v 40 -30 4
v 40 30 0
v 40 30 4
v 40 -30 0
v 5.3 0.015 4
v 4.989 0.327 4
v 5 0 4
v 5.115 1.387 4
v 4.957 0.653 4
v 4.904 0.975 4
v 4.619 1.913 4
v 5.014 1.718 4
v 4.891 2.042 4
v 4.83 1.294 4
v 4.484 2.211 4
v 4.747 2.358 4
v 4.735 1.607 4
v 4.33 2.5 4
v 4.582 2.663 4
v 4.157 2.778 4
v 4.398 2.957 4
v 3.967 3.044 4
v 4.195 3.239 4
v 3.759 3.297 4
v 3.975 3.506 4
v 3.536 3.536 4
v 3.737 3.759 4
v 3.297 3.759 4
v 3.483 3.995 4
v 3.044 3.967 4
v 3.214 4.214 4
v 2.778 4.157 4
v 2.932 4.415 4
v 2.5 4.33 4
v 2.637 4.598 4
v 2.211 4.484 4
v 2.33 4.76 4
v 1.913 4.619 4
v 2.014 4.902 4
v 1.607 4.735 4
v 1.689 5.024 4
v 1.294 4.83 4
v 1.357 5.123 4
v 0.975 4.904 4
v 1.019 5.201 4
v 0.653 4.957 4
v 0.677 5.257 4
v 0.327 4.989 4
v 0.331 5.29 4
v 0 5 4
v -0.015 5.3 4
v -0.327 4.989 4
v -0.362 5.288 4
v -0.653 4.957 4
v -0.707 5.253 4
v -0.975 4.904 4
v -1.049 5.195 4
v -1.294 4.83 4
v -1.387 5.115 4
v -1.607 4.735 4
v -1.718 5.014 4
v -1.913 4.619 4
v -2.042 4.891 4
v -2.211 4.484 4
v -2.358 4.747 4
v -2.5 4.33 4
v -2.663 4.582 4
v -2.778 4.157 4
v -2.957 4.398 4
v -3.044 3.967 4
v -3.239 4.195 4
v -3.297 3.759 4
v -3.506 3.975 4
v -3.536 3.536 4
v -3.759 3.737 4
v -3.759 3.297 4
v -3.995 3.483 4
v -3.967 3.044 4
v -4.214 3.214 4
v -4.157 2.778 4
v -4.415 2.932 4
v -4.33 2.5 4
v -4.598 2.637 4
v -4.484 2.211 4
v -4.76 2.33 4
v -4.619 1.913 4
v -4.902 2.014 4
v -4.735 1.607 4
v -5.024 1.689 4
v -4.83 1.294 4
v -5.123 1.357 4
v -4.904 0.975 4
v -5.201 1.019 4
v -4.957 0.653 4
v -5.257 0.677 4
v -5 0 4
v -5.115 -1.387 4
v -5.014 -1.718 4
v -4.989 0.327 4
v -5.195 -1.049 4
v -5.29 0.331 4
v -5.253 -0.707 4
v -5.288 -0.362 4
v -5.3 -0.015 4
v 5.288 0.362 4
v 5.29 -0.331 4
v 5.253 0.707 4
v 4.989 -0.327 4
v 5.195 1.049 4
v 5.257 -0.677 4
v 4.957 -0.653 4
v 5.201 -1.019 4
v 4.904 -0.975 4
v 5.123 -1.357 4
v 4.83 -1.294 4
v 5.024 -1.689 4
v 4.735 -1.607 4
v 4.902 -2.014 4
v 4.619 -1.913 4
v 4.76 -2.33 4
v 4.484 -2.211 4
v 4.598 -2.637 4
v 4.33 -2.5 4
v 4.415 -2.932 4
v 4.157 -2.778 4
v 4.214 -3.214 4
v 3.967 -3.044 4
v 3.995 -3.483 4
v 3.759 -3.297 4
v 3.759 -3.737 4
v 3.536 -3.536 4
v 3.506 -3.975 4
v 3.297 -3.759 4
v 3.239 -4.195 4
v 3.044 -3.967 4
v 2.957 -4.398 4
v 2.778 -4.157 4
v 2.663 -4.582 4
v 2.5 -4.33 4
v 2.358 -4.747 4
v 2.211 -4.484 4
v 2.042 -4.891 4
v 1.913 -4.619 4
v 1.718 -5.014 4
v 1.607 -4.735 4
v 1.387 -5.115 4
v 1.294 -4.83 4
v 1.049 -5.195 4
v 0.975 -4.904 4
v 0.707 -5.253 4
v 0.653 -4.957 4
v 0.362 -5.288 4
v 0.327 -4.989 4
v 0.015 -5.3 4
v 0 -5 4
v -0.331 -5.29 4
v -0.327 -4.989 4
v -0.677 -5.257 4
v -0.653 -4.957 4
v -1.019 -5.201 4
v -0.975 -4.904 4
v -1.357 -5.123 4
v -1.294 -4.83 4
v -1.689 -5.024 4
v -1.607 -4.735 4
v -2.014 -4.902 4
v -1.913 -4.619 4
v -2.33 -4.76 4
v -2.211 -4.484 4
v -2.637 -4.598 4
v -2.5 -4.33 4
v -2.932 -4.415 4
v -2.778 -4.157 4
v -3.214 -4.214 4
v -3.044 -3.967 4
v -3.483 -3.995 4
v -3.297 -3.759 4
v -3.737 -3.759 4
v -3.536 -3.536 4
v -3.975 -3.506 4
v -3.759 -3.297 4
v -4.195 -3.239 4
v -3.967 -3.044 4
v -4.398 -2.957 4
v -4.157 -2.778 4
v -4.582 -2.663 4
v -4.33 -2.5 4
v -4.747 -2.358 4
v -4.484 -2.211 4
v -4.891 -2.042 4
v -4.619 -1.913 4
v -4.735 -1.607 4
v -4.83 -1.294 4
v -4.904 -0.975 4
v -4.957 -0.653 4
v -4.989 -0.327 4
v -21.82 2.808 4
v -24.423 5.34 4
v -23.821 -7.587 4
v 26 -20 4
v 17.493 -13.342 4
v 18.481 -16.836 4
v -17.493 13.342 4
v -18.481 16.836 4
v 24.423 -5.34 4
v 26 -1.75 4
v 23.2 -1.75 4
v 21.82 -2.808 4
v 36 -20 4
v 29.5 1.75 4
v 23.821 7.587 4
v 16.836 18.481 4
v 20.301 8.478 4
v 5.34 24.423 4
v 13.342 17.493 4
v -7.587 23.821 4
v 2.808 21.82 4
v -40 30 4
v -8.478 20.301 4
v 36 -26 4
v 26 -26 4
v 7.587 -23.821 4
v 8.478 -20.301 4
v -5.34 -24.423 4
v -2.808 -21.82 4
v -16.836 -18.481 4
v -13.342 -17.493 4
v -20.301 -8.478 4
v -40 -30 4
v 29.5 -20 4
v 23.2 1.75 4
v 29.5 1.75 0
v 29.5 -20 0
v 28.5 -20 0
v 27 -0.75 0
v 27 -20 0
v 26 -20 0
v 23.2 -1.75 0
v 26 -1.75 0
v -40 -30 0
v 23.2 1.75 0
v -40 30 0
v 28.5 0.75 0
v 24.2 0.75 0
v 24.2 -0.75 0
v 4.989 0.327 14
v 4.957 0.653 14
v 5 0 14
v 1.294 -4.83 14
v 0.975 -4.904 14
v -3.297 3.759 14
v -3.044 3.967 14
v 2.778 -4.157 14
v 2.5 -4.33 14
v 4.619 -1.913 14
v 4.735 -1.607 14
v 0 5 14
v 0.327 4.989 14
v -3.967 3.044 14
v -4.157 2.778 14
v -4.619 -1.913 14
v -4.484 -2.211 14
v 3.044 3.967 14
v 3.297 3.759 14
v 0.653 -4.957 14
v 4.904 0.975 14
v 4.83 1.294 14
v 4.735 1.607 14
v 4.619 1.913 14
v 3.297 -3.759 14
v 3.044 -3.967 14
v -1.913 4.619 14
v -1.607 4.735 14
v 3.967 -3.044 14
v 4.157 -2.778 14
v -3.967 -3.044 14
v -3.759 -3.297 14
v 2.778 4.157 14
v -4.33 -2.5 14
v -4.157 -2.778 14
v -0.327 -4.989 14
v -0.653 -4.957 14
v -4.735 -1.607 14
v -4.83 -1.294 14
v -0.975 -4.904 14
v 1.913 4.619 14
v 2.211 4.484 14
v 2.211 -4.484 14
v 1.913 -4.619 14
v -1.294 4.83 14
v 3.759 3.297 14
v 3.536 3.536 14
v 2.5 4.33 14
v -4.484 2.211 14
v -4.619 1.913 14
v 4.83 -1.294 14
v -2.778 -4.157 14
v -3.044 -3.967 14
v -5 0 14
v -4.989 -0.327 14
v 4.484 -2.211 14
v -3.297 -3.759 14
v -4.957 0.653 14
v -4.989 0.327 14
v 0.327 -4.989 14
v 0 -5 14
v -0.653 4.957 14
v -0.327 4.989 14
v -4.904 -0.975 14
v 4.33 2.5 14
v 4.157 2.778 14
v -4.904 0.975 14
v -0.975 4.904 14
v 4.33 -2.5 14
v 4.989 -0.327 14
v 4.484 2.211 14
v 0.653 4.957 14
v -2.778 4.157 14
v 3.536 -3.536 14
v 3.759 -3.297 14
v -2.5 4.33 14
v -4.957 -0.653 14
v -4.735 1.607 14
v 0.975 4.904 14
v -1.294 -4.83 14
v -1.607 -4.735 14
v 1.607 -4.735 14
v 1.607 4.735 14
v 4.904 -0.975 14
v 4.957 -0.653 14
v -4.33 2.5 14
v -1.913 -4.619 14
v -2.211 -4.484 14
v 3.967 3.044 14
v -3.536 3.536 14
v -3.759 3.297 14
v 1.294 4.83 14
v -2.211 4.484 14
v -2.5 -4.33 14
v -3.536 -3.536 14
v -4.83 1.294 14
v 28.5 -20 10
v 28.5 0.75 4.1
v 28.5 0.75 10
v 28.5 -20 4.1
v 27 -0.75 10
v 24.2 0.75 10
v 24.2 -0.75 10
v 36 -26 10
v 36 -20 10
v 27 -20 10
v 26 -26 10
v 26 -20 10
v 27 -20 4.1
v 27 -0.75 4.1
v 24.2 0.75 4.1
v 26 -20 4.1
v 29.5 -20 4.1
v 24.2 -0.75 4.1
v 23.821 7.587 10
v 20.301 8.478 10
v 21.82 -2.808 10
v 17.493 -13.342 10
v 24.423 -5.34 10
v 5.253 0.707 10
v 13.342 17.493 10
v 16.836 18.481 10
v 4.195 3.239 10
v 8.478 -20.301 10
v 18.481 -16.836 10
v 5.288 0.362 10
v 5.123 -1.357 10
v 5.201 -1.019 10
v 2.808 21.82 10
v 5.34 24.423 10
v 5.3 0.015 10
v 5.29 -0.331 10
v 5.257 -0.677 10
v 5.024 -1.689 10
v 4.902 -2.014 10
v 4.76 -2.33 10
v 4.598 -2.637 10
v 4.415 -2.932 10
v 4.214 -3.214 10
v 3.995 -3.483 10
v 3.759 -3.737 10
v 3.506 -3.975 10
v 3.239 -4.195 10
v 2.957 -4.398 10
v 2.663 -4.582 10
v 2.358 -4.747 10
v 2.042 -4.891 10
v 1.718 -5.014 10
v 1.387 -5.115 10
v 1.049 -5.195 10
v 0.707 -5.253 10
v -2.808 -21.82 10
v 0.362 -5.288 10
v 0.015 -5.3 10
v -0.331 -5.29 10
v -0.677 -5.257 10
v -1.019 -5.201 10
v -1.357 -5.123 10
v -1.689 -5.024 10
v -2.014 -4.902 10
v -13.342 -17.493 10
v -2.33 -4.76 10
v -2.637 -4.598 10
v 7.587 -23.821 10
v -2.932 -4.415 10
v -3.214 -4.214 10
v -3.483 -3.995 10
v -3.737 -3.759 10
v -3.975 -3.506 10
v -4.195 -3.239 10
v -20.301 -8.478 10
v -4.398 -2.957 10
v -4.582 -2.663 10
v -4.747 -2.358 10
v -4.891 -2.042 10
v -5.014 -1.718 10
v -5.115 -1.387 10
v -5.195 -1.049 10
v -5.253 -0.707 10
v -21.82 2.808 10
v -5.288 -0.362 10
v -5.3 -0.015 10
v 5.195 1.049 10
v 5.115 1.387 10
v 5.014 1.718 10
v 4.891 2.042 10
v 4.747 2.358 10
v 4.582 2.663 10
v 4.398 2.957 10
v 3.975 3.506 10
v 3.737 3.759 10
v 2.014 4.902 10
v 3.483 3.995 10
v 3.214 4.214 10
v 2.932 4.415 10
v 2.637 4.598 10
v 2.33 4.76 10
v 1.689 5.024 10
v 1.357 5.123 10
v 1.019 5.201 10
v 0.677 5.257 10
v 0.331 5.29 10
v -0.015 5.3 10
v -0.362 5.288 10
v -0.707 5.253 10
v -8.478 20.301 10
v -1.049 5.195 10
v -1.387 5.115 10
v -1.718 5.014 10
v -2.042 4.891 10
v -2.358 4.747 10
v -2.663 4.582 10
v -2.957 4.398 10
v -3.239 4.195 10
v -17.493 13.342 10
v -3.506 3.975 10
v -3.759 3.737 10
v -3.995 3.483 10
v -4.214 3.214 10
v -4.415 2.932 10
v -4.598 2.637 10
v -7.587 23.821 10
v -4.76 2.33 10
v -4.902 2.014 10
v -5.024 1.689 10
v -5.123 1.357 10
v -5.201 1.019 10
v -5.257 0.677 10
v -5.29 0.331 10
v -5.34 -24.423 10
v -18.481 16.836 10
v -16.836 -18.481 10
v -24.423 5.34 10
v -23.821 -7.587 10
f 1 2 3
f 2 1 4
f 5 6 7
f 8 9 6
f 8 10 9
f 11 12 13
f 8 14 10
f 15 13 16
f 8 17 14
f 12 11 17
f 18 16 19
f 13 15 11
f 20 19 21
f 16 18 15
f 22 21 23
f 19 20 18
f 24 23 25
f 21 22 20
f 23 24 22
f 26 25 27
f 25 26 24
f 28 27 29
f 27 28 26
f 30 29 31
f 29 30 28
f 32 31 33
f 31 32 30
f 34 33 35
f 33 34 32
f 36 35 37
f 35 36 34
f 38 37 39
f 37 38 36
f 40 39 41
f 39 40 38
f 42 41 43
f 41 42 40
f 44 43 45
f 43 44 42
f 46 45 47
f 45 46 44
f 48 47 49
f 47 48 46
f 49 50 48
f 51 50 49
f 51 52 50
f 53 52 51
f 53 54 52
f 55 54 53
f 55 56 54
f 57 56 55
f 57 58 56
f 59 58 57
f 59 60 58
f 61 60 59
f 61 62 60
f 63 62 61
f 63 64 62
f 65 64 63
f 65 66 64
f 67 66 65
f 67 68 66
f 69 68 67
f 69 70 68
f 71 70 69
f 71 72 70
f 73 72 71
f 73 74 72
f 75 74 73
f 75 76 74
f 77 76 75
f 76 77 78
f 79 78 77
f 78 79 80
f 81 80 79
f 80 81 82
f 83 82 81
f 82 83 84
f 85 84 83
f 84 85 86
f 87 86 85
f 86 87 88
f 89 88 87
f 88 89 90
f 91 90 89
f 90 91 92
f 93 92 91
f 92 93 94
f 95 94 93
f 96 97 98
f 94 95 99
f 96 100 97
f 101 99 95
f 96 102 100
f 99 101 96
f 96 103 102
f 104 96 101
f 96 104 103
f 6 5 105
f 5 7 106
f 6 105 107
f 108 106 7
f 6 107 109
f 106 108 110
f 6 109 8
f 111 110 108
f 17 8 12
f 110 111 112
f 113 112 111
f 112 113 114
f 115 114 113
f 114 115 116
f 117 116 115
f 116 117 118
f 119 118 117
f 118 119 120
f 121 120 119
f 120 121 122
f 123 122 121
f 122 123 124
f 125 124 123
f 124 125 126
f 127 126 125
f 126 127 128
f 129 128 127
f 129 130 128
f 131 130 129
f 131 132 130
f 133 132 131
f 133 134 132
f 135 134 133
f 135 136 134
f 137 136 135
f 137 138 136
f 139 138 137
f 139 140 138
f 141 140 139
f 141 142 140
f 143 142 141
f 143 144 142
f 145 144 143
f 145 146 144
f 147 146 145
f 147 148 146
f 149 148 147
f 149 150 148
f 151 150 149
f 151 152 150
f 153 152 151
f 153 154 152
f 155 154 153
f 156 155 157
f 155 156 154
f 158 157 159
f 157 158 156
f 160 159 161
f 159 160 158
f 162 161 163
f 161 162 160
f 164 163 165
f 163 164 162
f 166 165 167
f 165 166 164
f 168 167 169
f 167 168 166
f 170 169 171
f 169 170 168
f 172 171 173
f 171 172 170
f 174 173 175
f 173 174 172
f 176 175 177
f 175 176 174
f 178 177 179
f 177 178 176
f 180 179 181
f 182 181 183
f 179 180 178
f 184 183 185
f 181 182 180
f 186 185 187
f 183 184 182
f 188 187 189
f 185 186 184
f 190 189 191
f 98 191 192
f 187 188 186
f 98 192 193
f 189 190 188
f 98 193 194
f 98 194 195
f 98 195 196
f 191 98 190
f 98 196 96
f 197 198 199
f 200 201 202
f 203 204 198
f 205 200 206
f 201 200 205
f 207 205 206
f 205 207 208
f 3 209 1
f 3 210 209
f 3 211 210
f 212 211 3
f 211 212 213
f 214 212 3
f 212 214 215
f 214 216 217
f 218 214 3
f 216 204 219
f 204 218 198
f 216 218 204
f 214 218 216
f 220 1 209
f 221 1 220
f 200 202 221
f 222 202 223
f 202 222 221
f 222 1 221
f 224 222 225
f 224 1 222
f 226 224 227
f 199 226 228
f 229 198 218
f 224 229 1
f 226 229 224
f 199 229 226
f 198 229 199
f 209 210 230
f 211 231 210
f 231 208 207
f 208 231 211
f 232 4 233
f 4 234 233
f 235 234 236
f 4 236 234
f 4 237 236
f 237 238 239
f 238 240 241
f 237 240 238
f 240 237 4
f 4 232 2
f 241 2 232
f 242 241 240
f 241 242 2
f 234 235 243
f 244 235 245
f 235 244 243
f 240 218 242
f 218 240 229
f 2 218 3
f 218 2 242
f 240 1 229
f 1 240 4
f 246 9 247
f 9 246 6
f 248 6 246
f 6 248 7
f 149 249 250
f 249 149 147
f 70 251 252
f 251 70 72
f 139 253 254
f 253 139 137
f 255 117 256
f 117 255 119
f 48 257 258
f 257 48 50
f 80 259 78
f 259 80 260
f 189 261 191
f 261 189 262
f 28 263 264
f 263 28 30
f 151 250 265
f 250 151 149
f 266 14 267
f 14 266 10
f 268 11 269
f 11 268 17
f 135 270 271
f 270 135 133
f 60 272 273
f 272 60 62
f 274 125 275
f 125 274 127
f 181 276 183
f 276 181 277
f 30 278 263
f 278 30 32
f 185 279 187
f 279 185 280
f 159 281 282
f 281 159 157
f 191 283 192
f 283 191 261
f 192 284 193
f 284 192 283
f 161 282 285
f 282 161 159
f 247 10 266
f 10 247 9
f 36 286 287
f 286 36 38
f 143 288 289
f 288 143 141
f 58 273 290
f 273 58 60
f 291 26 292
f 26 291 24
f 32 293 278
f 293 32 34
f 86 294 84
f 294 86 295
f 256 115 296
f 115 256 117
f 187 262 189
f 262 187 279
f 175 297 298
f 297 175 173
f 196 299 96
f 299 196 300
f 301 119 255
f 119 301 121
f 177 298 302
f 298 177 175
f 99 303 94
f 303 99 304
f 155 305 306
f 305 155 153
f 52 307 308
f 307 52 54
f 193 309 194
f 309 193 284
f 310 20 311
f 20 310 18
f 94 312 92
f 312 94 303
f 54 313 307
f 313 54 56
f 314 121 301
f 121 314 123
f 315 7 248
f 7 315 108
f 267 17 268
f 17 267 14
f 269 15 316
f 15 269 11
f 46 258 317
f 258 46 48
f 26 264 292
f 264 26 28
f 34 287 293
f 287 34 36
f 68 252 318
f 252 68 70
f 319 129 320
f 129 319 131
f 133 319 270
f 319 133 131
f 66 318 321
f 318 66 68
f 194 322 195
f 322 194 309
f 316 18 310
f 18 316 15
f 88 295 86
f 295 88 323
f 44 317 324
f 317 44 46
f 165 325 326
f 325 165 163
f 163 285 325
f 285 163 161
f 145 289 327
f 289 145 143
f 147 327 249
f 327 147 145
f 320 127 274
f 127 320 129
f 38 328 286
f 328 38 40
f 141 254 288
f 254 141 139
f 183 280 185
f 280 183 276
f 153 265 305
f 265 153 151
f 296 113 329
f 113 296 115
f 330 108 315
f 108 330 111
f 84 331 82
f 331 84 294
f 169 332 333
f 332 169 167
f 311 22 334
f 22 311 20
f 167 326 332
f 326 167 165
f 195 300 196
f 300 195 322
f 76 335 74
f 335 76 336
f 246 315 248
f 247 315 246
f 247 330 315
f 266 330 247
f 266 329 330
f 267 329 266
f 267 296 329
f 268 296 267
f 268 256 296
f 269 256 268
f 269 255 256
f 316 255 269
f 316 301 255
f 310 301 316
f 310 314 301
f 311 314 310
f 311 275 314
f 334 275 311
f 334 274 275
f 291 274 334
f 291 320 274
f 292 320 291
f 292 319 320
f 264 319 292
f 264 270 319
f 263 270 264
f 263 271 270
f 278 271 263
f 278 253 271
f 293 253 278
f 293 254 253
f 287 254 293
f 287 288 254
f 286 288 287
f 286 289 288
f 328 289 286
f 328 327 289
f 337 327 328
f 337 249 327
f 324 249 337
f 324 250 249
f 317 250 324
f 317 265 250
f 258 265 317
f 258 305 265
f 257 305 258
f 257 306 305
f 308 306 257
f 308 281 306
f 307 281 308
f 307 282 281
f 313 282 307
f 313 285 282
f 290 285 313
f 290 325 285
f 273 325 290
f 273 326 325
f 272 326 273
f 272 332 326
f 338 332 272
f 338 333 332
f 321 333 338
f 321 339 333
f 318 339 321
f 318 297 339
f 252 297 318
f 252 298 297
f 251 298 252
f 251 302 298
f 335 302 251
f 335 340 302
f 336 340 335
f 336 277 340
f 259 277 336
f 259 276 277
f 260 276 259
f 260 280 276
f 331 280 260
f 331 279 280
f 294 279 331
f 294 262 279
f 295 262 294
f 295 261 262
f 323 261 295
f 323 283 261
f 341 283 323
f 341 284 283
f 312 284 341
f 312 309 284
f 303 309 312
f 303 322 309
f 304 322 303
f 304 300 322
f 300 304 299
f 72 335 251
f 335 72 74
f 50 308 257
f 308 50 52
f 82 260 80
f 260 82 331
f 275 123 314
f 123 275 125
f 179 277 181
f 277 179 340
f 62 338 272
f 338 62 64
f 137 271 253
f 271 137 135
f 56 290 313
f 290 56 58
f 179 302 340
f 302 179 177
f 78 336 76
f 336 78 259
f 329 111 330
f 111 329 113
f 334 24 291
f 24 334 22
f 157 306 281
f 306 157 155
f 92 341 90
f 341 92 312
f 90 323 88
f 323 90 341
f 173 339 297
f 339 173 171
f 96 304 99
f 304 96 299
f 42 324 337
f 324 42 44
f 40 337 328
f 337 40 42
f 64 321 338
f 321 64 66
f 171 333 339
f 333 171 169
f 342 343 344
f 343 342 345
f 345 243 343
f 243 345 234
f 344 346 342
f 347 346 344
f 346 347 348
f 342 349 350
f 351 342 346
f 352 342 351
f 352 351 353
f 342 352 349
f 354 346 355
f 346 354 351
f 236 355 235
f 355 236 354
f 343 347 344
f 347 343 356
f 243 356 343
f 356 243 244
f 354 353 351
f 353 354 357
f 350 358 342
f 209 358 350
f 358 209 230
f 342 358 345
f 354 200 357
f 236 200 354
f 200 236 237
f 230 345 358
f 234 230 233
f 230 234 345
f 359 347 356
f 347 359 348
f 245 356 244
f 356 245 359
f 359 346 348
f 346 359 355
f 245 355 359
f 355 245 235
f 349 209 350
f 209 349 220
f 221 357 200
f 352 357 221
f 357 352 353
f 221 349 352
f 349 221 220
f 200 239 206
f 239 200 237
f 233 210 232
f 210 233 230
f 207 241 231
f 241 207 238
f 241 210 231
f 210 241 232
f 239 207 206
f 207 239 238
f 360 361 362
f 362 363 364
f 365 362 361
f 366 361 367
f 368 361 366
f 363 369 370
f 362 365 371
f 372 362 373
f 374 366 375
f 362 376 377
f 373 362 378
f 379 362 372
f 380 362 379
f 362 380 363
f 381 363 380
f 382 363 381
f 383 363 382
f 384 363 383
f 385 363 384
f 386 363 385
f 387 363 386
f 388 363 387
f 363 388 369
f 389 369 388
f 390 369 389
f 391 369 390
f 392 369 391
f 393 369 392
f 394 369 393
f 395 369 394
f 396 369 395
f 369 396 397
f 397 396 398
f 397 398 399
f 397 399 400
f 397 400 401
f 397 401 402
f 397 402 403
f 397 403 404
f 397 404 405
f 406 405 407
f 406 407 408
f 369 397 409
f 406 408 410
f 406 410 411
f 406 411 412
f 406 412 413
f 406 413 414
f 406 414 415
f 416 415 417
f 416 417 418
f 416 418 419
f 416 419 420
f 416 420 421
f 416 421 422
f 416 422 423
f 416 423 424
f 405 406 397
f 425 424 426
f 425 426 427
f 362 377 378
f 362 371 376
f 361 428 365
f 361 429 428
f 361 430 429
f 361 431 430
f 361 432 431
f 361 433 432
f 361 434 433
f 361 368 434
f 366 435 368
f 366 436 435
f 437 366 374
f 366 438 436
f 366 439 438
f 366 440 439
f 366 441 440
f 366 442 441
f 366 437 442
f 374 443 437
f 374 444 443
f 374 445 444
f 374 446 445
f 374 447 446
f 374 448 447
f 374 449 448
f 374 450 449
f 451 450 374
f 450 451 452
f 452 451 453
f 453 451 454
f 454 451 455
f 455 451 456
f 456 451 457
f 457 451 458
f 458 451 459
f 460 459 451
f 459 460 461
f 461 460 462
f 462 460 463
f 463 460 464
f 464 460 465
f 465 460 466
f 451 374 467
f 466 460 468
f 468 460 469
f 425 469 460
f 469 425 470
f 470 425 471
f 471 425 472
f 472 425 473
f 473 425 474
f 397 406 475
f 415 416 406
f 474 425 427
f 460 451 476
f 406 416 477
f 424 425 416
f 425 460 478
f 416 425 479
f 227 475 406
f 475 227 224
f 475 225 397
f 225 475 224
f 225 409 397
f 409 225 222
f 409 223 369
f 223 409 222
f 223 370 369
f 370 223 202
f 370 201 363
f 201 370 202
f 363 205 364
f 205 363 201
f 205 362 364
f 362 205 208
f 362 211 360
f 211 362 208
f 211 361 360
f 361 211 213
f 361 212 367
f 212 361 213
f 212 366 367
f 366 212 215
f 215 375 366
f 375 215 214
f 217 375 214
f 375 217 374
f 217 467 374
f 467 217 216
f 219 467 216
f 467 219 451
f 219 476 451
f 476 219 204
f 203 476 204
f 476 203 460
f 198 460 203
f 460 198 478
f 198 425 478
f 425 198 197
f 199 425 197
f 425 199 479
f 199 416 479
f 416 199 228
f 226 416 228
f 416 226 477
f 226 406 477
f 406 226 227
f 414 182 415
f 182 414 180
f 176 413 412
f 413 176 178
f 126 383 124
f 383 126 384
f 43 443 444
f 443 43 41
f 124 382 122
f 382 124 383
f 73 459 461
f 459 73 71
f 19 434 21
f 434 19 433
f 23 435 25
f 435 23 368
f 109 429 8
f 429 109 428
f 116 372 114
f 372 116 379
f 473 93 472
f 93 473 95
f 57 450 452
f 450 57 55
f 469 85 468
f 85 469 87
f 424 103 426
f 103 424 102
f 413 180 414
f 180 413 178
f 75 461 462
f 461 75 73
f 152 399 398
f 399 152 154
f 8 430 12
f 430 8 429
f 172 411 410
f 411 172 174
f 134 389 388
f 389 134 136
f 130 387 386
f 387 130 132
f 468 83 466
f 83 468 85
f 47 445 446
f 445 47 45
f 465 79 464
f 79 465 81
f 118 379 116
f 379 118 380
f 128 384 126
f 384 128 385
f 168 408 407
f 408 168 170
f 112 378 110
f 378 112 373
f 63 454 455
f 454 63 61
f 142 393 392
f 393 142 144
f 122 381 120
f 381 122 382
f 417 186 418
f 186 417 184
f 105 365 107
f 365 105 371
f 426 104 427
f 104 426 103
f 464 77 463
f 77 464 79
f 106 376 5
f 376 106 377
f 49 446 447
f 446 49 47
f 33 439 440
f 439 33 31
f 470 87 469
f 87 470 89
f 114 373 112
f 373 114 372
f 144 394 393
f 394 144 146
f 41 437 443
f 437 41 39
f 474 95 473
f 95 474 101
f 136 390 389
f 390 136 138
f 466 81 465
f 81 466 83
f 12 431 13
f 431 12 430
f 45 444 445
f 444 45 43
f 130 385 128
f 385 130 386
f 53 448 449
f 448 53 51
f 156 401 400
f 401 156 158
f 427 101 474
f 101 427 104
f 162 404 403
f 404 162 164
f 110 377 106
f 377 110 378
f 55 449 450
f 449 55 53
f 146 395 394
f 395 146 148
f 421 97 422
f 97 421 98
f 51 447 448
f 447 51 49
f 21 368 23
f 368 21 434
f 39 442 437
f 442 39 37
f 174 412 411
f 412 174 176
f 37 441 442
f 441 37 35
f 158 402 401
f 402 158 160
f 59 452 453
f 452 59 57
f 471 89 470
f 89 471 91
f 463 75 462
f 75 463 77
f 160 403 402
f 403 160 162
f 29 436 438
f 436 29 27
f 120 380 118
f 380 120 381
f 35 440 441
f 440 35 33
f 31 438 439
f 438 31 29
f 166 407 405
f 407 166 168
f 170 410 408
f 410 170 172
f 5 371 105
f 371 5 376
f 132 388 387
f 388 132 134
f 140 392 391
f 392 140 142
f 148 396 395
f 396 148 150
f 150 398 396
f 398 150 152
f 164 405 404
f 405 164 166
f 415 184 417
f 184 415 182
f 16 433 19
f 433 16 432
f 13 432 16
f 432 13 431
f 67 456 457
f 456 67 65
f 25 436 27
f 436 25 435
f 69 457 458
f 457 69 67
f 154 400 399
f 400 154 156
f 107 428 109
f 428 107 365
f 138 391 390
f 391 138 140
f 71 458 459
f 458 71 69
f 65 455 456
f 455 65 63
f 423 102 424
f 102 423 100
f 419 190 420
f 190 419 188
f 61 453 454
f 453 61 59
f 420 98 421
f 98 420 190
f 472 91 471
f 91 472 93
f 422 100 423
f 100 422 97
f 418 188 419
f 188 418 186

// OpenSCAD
cadverify_only = "";
module instance(name, part, unit = 1) {
    echo(cadverify_instance = [name, part, unit]);
    if (cadverify_only == "" || cadverify_only == name) children();
}

// Part selector: base, wheel, assembly
part = "assembly"; // [base, wheel, assembly]

$fn = 96;

// Parameters
Rt = 25;        // wheel tip radius (50mm across)
Rr = 22;        // wheel root radius
Nteeth = 12;
wheel_t = 6;    // wheel thickness
bore_r = 5.3;   // wheel bore radius (post 5.0 + 0.3 clearance)
post_r = 5;
post_h = 14;    // base bottom to post top
base_t = 4;     // base plate thickness
plate_x = 80;
plate_y = 60;
gap_angle = 37.3333333; // gap center for nominal assembly

module wheel() {
    pts = [ for (k=[0:2*Nteeth-1])
        let(i=floor(k/2),
            a = (k%2==0) ? i*360/Nteeth : i*360/Nteeth+25,
            r = (k%2==0) ? Rr : Rt)
        [r*cos(a), r*sin(a)] ];
    difference() {
        linear_extrude(height=wheel_t, convexity=4)
            polygon(pts);
        translate([0,0,-0.1])
            cylinder(h=wheel_t+0.2, r=bore_r);
    }
}

module base() {
    difference() {
        union() {
            // plate
            translate([-plate_x/2, -plate_y/2, 0])
                cube([plate_x, plate_y, base_t]);
            // post
            cylinder(h=post_h, r=post_r);
            // pawl backbone (tall)
            translate([27, -20, 0])
                cube([1.5, 20.75, 10]);
            // pawl finger (tall, radial)
            translate([24.2, -0.75, 0])
                cube([4.3, 1.5, 10]);
            // anchor block (full height fixation)
            translate([26, -26, 0])
                cube([10, 6, 10]);
        }
        // slot voids through plate (z -0.1..4.1)
        translate([26, -20, -0.1]) cube([1, 19.25, 4.2]);      // west of backbone
        translate([28.5, -20, -0.1]) cube([1, 20.75, 4.2]);    // east of backbone
        translate([23.2, 0.75, -0.1]) cube([6.3, 1, 4.2]);      // north
        translate([23.2, -1.75, -0.1]) cube([3.8, 1, 4.2]);     // south of finger tip
        translate([23.2, -1.75, -0.1]) cube([1, 3.5, 4.2]);     // west of tip
    }
}

if (part == "wheel") {
    echo(cadverify_spec = [
        ["bounds", [[-25, -25, 0], [25, 25, 6]]],
        ["bodies", 1],
        ["through_holes", 1],
        ["support_faces", [["bottom", "-z", 1000]]],
        ["overhangs_allowed", []],
        ["copies", 1],
        ["details", [
            ["hub", "material", [[5, 5, 0.5], [10, 10, 5.5]], 0.9],
            ["bore", "hole", [0, 0, 7], [0, 0, -1], [[0, 10.6], [6, 10.6]]],
            ["rim", "thickness", [15, 0, 7], [0, 0, -1], 6],
            ["teeth", "view", [[20, -15, 0], [25, 15, 6]]]
        ]]
    ]);
    wheel();
} else if (part == "base") {
    echo(cadverify_spec = [
        ["bounds", [[-40, -30, 0], [40, 30, 14]]],
        ["bodies", 1],
        ["through_holes", 1],
        ["support_faces", [["bottom", "-z", 4000]]],
        ["overhangs_allowed", []],
        ["copies", 1],
        ["details", [
            ["pawl_arm", "material", [[27.1, -10, 4.1], [28.4, -5, 9.9]], 0.9],
            ["slot", "void", [[26.1, -15, 0.5], [26.9, -5, 3.5]], 0.9],
            ["base_floor", "thickness", [-20, 20, -1], [0, 0, 1], 4],
            ["pawl_tip", "view", [[23, -2, 4], [26, 2, 10]]]
        ]]
    ]);
    base();
} else if (part == "assembly") {
    echo(cadverify_spec = [
        ["bounds", [[-40, -30, 0], [40, 30, 14]]],
        ["support_faces", [["table", "-z", 4000]]],
        ["motions", [
            ["free", ["wheel1"], "rotate", [0, 0, 4], [0, 0, 1], [0, -30],
                ["flex", [["wheel1", "base1", 1.0, "pawl arm bends as tooth passes"]]]],
            ["locked", ["wheel1"], "rotate", [0, 0, 4], [0, 0, 1], [0, 8],
                ["stops", [8]]]
        ]],
        ["assembly_order", [
            [["base1"], [0, 0, 0]],
            [["wheel1"], [0, 0, 1]]
        ]]
    ]);
    instance("base1", "base") base();
    instance("wheel1", "wheel") translate([0, 0, 4]) rotate([0, 0, -gap_angle]) wheel();
}
